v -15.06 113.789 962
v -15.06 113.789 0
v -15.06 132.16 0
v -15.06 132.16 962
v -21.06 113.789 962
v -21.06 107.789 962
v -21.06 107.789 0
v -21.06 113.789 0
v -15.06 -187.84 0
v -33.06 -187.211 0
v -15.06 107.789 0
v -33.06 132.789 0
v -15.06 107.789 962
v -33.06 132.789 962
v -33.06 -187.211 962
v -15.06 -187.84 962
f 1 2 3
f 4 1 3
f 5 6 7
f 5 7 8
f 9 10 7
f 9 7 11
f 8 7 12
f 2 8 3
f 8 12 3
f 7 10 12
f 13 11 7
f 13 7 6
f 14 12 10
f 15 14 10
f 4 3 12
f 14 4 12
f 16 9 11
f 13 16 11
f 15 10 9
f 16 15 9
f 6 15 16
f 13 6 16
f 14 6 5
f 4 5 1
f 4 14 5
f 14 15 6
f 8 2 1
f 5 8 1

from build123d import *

# Parameters (mm, degrees)
F1_DEPTH = 962
F2_W     = 6
F2_H     = 962
F3_DEPTH = 6


with BuildPart() as f1:
    # F0 (on Top) → F1 (new body)
    with BuildSketch(Plane.XY):
        Polygon((-15.060008, -187.839949), (-15.060008, 132.160051), (-33.060008, 132.788625), (-33.060008, -187.211375), align=None)
    extrude(amount=F1_DEPTH)

    # F2 (on face) → F3 (cut)
    with BuildSketch(Plane.YZ.offset(-15.060008)):
        with Locations((110.788625, 481)):
            Rectangle(F2_W, F2_H)
    extrude(amount=-F3_DEPTH, mode=Mode.SUBTRACT)


solid = f1.part
